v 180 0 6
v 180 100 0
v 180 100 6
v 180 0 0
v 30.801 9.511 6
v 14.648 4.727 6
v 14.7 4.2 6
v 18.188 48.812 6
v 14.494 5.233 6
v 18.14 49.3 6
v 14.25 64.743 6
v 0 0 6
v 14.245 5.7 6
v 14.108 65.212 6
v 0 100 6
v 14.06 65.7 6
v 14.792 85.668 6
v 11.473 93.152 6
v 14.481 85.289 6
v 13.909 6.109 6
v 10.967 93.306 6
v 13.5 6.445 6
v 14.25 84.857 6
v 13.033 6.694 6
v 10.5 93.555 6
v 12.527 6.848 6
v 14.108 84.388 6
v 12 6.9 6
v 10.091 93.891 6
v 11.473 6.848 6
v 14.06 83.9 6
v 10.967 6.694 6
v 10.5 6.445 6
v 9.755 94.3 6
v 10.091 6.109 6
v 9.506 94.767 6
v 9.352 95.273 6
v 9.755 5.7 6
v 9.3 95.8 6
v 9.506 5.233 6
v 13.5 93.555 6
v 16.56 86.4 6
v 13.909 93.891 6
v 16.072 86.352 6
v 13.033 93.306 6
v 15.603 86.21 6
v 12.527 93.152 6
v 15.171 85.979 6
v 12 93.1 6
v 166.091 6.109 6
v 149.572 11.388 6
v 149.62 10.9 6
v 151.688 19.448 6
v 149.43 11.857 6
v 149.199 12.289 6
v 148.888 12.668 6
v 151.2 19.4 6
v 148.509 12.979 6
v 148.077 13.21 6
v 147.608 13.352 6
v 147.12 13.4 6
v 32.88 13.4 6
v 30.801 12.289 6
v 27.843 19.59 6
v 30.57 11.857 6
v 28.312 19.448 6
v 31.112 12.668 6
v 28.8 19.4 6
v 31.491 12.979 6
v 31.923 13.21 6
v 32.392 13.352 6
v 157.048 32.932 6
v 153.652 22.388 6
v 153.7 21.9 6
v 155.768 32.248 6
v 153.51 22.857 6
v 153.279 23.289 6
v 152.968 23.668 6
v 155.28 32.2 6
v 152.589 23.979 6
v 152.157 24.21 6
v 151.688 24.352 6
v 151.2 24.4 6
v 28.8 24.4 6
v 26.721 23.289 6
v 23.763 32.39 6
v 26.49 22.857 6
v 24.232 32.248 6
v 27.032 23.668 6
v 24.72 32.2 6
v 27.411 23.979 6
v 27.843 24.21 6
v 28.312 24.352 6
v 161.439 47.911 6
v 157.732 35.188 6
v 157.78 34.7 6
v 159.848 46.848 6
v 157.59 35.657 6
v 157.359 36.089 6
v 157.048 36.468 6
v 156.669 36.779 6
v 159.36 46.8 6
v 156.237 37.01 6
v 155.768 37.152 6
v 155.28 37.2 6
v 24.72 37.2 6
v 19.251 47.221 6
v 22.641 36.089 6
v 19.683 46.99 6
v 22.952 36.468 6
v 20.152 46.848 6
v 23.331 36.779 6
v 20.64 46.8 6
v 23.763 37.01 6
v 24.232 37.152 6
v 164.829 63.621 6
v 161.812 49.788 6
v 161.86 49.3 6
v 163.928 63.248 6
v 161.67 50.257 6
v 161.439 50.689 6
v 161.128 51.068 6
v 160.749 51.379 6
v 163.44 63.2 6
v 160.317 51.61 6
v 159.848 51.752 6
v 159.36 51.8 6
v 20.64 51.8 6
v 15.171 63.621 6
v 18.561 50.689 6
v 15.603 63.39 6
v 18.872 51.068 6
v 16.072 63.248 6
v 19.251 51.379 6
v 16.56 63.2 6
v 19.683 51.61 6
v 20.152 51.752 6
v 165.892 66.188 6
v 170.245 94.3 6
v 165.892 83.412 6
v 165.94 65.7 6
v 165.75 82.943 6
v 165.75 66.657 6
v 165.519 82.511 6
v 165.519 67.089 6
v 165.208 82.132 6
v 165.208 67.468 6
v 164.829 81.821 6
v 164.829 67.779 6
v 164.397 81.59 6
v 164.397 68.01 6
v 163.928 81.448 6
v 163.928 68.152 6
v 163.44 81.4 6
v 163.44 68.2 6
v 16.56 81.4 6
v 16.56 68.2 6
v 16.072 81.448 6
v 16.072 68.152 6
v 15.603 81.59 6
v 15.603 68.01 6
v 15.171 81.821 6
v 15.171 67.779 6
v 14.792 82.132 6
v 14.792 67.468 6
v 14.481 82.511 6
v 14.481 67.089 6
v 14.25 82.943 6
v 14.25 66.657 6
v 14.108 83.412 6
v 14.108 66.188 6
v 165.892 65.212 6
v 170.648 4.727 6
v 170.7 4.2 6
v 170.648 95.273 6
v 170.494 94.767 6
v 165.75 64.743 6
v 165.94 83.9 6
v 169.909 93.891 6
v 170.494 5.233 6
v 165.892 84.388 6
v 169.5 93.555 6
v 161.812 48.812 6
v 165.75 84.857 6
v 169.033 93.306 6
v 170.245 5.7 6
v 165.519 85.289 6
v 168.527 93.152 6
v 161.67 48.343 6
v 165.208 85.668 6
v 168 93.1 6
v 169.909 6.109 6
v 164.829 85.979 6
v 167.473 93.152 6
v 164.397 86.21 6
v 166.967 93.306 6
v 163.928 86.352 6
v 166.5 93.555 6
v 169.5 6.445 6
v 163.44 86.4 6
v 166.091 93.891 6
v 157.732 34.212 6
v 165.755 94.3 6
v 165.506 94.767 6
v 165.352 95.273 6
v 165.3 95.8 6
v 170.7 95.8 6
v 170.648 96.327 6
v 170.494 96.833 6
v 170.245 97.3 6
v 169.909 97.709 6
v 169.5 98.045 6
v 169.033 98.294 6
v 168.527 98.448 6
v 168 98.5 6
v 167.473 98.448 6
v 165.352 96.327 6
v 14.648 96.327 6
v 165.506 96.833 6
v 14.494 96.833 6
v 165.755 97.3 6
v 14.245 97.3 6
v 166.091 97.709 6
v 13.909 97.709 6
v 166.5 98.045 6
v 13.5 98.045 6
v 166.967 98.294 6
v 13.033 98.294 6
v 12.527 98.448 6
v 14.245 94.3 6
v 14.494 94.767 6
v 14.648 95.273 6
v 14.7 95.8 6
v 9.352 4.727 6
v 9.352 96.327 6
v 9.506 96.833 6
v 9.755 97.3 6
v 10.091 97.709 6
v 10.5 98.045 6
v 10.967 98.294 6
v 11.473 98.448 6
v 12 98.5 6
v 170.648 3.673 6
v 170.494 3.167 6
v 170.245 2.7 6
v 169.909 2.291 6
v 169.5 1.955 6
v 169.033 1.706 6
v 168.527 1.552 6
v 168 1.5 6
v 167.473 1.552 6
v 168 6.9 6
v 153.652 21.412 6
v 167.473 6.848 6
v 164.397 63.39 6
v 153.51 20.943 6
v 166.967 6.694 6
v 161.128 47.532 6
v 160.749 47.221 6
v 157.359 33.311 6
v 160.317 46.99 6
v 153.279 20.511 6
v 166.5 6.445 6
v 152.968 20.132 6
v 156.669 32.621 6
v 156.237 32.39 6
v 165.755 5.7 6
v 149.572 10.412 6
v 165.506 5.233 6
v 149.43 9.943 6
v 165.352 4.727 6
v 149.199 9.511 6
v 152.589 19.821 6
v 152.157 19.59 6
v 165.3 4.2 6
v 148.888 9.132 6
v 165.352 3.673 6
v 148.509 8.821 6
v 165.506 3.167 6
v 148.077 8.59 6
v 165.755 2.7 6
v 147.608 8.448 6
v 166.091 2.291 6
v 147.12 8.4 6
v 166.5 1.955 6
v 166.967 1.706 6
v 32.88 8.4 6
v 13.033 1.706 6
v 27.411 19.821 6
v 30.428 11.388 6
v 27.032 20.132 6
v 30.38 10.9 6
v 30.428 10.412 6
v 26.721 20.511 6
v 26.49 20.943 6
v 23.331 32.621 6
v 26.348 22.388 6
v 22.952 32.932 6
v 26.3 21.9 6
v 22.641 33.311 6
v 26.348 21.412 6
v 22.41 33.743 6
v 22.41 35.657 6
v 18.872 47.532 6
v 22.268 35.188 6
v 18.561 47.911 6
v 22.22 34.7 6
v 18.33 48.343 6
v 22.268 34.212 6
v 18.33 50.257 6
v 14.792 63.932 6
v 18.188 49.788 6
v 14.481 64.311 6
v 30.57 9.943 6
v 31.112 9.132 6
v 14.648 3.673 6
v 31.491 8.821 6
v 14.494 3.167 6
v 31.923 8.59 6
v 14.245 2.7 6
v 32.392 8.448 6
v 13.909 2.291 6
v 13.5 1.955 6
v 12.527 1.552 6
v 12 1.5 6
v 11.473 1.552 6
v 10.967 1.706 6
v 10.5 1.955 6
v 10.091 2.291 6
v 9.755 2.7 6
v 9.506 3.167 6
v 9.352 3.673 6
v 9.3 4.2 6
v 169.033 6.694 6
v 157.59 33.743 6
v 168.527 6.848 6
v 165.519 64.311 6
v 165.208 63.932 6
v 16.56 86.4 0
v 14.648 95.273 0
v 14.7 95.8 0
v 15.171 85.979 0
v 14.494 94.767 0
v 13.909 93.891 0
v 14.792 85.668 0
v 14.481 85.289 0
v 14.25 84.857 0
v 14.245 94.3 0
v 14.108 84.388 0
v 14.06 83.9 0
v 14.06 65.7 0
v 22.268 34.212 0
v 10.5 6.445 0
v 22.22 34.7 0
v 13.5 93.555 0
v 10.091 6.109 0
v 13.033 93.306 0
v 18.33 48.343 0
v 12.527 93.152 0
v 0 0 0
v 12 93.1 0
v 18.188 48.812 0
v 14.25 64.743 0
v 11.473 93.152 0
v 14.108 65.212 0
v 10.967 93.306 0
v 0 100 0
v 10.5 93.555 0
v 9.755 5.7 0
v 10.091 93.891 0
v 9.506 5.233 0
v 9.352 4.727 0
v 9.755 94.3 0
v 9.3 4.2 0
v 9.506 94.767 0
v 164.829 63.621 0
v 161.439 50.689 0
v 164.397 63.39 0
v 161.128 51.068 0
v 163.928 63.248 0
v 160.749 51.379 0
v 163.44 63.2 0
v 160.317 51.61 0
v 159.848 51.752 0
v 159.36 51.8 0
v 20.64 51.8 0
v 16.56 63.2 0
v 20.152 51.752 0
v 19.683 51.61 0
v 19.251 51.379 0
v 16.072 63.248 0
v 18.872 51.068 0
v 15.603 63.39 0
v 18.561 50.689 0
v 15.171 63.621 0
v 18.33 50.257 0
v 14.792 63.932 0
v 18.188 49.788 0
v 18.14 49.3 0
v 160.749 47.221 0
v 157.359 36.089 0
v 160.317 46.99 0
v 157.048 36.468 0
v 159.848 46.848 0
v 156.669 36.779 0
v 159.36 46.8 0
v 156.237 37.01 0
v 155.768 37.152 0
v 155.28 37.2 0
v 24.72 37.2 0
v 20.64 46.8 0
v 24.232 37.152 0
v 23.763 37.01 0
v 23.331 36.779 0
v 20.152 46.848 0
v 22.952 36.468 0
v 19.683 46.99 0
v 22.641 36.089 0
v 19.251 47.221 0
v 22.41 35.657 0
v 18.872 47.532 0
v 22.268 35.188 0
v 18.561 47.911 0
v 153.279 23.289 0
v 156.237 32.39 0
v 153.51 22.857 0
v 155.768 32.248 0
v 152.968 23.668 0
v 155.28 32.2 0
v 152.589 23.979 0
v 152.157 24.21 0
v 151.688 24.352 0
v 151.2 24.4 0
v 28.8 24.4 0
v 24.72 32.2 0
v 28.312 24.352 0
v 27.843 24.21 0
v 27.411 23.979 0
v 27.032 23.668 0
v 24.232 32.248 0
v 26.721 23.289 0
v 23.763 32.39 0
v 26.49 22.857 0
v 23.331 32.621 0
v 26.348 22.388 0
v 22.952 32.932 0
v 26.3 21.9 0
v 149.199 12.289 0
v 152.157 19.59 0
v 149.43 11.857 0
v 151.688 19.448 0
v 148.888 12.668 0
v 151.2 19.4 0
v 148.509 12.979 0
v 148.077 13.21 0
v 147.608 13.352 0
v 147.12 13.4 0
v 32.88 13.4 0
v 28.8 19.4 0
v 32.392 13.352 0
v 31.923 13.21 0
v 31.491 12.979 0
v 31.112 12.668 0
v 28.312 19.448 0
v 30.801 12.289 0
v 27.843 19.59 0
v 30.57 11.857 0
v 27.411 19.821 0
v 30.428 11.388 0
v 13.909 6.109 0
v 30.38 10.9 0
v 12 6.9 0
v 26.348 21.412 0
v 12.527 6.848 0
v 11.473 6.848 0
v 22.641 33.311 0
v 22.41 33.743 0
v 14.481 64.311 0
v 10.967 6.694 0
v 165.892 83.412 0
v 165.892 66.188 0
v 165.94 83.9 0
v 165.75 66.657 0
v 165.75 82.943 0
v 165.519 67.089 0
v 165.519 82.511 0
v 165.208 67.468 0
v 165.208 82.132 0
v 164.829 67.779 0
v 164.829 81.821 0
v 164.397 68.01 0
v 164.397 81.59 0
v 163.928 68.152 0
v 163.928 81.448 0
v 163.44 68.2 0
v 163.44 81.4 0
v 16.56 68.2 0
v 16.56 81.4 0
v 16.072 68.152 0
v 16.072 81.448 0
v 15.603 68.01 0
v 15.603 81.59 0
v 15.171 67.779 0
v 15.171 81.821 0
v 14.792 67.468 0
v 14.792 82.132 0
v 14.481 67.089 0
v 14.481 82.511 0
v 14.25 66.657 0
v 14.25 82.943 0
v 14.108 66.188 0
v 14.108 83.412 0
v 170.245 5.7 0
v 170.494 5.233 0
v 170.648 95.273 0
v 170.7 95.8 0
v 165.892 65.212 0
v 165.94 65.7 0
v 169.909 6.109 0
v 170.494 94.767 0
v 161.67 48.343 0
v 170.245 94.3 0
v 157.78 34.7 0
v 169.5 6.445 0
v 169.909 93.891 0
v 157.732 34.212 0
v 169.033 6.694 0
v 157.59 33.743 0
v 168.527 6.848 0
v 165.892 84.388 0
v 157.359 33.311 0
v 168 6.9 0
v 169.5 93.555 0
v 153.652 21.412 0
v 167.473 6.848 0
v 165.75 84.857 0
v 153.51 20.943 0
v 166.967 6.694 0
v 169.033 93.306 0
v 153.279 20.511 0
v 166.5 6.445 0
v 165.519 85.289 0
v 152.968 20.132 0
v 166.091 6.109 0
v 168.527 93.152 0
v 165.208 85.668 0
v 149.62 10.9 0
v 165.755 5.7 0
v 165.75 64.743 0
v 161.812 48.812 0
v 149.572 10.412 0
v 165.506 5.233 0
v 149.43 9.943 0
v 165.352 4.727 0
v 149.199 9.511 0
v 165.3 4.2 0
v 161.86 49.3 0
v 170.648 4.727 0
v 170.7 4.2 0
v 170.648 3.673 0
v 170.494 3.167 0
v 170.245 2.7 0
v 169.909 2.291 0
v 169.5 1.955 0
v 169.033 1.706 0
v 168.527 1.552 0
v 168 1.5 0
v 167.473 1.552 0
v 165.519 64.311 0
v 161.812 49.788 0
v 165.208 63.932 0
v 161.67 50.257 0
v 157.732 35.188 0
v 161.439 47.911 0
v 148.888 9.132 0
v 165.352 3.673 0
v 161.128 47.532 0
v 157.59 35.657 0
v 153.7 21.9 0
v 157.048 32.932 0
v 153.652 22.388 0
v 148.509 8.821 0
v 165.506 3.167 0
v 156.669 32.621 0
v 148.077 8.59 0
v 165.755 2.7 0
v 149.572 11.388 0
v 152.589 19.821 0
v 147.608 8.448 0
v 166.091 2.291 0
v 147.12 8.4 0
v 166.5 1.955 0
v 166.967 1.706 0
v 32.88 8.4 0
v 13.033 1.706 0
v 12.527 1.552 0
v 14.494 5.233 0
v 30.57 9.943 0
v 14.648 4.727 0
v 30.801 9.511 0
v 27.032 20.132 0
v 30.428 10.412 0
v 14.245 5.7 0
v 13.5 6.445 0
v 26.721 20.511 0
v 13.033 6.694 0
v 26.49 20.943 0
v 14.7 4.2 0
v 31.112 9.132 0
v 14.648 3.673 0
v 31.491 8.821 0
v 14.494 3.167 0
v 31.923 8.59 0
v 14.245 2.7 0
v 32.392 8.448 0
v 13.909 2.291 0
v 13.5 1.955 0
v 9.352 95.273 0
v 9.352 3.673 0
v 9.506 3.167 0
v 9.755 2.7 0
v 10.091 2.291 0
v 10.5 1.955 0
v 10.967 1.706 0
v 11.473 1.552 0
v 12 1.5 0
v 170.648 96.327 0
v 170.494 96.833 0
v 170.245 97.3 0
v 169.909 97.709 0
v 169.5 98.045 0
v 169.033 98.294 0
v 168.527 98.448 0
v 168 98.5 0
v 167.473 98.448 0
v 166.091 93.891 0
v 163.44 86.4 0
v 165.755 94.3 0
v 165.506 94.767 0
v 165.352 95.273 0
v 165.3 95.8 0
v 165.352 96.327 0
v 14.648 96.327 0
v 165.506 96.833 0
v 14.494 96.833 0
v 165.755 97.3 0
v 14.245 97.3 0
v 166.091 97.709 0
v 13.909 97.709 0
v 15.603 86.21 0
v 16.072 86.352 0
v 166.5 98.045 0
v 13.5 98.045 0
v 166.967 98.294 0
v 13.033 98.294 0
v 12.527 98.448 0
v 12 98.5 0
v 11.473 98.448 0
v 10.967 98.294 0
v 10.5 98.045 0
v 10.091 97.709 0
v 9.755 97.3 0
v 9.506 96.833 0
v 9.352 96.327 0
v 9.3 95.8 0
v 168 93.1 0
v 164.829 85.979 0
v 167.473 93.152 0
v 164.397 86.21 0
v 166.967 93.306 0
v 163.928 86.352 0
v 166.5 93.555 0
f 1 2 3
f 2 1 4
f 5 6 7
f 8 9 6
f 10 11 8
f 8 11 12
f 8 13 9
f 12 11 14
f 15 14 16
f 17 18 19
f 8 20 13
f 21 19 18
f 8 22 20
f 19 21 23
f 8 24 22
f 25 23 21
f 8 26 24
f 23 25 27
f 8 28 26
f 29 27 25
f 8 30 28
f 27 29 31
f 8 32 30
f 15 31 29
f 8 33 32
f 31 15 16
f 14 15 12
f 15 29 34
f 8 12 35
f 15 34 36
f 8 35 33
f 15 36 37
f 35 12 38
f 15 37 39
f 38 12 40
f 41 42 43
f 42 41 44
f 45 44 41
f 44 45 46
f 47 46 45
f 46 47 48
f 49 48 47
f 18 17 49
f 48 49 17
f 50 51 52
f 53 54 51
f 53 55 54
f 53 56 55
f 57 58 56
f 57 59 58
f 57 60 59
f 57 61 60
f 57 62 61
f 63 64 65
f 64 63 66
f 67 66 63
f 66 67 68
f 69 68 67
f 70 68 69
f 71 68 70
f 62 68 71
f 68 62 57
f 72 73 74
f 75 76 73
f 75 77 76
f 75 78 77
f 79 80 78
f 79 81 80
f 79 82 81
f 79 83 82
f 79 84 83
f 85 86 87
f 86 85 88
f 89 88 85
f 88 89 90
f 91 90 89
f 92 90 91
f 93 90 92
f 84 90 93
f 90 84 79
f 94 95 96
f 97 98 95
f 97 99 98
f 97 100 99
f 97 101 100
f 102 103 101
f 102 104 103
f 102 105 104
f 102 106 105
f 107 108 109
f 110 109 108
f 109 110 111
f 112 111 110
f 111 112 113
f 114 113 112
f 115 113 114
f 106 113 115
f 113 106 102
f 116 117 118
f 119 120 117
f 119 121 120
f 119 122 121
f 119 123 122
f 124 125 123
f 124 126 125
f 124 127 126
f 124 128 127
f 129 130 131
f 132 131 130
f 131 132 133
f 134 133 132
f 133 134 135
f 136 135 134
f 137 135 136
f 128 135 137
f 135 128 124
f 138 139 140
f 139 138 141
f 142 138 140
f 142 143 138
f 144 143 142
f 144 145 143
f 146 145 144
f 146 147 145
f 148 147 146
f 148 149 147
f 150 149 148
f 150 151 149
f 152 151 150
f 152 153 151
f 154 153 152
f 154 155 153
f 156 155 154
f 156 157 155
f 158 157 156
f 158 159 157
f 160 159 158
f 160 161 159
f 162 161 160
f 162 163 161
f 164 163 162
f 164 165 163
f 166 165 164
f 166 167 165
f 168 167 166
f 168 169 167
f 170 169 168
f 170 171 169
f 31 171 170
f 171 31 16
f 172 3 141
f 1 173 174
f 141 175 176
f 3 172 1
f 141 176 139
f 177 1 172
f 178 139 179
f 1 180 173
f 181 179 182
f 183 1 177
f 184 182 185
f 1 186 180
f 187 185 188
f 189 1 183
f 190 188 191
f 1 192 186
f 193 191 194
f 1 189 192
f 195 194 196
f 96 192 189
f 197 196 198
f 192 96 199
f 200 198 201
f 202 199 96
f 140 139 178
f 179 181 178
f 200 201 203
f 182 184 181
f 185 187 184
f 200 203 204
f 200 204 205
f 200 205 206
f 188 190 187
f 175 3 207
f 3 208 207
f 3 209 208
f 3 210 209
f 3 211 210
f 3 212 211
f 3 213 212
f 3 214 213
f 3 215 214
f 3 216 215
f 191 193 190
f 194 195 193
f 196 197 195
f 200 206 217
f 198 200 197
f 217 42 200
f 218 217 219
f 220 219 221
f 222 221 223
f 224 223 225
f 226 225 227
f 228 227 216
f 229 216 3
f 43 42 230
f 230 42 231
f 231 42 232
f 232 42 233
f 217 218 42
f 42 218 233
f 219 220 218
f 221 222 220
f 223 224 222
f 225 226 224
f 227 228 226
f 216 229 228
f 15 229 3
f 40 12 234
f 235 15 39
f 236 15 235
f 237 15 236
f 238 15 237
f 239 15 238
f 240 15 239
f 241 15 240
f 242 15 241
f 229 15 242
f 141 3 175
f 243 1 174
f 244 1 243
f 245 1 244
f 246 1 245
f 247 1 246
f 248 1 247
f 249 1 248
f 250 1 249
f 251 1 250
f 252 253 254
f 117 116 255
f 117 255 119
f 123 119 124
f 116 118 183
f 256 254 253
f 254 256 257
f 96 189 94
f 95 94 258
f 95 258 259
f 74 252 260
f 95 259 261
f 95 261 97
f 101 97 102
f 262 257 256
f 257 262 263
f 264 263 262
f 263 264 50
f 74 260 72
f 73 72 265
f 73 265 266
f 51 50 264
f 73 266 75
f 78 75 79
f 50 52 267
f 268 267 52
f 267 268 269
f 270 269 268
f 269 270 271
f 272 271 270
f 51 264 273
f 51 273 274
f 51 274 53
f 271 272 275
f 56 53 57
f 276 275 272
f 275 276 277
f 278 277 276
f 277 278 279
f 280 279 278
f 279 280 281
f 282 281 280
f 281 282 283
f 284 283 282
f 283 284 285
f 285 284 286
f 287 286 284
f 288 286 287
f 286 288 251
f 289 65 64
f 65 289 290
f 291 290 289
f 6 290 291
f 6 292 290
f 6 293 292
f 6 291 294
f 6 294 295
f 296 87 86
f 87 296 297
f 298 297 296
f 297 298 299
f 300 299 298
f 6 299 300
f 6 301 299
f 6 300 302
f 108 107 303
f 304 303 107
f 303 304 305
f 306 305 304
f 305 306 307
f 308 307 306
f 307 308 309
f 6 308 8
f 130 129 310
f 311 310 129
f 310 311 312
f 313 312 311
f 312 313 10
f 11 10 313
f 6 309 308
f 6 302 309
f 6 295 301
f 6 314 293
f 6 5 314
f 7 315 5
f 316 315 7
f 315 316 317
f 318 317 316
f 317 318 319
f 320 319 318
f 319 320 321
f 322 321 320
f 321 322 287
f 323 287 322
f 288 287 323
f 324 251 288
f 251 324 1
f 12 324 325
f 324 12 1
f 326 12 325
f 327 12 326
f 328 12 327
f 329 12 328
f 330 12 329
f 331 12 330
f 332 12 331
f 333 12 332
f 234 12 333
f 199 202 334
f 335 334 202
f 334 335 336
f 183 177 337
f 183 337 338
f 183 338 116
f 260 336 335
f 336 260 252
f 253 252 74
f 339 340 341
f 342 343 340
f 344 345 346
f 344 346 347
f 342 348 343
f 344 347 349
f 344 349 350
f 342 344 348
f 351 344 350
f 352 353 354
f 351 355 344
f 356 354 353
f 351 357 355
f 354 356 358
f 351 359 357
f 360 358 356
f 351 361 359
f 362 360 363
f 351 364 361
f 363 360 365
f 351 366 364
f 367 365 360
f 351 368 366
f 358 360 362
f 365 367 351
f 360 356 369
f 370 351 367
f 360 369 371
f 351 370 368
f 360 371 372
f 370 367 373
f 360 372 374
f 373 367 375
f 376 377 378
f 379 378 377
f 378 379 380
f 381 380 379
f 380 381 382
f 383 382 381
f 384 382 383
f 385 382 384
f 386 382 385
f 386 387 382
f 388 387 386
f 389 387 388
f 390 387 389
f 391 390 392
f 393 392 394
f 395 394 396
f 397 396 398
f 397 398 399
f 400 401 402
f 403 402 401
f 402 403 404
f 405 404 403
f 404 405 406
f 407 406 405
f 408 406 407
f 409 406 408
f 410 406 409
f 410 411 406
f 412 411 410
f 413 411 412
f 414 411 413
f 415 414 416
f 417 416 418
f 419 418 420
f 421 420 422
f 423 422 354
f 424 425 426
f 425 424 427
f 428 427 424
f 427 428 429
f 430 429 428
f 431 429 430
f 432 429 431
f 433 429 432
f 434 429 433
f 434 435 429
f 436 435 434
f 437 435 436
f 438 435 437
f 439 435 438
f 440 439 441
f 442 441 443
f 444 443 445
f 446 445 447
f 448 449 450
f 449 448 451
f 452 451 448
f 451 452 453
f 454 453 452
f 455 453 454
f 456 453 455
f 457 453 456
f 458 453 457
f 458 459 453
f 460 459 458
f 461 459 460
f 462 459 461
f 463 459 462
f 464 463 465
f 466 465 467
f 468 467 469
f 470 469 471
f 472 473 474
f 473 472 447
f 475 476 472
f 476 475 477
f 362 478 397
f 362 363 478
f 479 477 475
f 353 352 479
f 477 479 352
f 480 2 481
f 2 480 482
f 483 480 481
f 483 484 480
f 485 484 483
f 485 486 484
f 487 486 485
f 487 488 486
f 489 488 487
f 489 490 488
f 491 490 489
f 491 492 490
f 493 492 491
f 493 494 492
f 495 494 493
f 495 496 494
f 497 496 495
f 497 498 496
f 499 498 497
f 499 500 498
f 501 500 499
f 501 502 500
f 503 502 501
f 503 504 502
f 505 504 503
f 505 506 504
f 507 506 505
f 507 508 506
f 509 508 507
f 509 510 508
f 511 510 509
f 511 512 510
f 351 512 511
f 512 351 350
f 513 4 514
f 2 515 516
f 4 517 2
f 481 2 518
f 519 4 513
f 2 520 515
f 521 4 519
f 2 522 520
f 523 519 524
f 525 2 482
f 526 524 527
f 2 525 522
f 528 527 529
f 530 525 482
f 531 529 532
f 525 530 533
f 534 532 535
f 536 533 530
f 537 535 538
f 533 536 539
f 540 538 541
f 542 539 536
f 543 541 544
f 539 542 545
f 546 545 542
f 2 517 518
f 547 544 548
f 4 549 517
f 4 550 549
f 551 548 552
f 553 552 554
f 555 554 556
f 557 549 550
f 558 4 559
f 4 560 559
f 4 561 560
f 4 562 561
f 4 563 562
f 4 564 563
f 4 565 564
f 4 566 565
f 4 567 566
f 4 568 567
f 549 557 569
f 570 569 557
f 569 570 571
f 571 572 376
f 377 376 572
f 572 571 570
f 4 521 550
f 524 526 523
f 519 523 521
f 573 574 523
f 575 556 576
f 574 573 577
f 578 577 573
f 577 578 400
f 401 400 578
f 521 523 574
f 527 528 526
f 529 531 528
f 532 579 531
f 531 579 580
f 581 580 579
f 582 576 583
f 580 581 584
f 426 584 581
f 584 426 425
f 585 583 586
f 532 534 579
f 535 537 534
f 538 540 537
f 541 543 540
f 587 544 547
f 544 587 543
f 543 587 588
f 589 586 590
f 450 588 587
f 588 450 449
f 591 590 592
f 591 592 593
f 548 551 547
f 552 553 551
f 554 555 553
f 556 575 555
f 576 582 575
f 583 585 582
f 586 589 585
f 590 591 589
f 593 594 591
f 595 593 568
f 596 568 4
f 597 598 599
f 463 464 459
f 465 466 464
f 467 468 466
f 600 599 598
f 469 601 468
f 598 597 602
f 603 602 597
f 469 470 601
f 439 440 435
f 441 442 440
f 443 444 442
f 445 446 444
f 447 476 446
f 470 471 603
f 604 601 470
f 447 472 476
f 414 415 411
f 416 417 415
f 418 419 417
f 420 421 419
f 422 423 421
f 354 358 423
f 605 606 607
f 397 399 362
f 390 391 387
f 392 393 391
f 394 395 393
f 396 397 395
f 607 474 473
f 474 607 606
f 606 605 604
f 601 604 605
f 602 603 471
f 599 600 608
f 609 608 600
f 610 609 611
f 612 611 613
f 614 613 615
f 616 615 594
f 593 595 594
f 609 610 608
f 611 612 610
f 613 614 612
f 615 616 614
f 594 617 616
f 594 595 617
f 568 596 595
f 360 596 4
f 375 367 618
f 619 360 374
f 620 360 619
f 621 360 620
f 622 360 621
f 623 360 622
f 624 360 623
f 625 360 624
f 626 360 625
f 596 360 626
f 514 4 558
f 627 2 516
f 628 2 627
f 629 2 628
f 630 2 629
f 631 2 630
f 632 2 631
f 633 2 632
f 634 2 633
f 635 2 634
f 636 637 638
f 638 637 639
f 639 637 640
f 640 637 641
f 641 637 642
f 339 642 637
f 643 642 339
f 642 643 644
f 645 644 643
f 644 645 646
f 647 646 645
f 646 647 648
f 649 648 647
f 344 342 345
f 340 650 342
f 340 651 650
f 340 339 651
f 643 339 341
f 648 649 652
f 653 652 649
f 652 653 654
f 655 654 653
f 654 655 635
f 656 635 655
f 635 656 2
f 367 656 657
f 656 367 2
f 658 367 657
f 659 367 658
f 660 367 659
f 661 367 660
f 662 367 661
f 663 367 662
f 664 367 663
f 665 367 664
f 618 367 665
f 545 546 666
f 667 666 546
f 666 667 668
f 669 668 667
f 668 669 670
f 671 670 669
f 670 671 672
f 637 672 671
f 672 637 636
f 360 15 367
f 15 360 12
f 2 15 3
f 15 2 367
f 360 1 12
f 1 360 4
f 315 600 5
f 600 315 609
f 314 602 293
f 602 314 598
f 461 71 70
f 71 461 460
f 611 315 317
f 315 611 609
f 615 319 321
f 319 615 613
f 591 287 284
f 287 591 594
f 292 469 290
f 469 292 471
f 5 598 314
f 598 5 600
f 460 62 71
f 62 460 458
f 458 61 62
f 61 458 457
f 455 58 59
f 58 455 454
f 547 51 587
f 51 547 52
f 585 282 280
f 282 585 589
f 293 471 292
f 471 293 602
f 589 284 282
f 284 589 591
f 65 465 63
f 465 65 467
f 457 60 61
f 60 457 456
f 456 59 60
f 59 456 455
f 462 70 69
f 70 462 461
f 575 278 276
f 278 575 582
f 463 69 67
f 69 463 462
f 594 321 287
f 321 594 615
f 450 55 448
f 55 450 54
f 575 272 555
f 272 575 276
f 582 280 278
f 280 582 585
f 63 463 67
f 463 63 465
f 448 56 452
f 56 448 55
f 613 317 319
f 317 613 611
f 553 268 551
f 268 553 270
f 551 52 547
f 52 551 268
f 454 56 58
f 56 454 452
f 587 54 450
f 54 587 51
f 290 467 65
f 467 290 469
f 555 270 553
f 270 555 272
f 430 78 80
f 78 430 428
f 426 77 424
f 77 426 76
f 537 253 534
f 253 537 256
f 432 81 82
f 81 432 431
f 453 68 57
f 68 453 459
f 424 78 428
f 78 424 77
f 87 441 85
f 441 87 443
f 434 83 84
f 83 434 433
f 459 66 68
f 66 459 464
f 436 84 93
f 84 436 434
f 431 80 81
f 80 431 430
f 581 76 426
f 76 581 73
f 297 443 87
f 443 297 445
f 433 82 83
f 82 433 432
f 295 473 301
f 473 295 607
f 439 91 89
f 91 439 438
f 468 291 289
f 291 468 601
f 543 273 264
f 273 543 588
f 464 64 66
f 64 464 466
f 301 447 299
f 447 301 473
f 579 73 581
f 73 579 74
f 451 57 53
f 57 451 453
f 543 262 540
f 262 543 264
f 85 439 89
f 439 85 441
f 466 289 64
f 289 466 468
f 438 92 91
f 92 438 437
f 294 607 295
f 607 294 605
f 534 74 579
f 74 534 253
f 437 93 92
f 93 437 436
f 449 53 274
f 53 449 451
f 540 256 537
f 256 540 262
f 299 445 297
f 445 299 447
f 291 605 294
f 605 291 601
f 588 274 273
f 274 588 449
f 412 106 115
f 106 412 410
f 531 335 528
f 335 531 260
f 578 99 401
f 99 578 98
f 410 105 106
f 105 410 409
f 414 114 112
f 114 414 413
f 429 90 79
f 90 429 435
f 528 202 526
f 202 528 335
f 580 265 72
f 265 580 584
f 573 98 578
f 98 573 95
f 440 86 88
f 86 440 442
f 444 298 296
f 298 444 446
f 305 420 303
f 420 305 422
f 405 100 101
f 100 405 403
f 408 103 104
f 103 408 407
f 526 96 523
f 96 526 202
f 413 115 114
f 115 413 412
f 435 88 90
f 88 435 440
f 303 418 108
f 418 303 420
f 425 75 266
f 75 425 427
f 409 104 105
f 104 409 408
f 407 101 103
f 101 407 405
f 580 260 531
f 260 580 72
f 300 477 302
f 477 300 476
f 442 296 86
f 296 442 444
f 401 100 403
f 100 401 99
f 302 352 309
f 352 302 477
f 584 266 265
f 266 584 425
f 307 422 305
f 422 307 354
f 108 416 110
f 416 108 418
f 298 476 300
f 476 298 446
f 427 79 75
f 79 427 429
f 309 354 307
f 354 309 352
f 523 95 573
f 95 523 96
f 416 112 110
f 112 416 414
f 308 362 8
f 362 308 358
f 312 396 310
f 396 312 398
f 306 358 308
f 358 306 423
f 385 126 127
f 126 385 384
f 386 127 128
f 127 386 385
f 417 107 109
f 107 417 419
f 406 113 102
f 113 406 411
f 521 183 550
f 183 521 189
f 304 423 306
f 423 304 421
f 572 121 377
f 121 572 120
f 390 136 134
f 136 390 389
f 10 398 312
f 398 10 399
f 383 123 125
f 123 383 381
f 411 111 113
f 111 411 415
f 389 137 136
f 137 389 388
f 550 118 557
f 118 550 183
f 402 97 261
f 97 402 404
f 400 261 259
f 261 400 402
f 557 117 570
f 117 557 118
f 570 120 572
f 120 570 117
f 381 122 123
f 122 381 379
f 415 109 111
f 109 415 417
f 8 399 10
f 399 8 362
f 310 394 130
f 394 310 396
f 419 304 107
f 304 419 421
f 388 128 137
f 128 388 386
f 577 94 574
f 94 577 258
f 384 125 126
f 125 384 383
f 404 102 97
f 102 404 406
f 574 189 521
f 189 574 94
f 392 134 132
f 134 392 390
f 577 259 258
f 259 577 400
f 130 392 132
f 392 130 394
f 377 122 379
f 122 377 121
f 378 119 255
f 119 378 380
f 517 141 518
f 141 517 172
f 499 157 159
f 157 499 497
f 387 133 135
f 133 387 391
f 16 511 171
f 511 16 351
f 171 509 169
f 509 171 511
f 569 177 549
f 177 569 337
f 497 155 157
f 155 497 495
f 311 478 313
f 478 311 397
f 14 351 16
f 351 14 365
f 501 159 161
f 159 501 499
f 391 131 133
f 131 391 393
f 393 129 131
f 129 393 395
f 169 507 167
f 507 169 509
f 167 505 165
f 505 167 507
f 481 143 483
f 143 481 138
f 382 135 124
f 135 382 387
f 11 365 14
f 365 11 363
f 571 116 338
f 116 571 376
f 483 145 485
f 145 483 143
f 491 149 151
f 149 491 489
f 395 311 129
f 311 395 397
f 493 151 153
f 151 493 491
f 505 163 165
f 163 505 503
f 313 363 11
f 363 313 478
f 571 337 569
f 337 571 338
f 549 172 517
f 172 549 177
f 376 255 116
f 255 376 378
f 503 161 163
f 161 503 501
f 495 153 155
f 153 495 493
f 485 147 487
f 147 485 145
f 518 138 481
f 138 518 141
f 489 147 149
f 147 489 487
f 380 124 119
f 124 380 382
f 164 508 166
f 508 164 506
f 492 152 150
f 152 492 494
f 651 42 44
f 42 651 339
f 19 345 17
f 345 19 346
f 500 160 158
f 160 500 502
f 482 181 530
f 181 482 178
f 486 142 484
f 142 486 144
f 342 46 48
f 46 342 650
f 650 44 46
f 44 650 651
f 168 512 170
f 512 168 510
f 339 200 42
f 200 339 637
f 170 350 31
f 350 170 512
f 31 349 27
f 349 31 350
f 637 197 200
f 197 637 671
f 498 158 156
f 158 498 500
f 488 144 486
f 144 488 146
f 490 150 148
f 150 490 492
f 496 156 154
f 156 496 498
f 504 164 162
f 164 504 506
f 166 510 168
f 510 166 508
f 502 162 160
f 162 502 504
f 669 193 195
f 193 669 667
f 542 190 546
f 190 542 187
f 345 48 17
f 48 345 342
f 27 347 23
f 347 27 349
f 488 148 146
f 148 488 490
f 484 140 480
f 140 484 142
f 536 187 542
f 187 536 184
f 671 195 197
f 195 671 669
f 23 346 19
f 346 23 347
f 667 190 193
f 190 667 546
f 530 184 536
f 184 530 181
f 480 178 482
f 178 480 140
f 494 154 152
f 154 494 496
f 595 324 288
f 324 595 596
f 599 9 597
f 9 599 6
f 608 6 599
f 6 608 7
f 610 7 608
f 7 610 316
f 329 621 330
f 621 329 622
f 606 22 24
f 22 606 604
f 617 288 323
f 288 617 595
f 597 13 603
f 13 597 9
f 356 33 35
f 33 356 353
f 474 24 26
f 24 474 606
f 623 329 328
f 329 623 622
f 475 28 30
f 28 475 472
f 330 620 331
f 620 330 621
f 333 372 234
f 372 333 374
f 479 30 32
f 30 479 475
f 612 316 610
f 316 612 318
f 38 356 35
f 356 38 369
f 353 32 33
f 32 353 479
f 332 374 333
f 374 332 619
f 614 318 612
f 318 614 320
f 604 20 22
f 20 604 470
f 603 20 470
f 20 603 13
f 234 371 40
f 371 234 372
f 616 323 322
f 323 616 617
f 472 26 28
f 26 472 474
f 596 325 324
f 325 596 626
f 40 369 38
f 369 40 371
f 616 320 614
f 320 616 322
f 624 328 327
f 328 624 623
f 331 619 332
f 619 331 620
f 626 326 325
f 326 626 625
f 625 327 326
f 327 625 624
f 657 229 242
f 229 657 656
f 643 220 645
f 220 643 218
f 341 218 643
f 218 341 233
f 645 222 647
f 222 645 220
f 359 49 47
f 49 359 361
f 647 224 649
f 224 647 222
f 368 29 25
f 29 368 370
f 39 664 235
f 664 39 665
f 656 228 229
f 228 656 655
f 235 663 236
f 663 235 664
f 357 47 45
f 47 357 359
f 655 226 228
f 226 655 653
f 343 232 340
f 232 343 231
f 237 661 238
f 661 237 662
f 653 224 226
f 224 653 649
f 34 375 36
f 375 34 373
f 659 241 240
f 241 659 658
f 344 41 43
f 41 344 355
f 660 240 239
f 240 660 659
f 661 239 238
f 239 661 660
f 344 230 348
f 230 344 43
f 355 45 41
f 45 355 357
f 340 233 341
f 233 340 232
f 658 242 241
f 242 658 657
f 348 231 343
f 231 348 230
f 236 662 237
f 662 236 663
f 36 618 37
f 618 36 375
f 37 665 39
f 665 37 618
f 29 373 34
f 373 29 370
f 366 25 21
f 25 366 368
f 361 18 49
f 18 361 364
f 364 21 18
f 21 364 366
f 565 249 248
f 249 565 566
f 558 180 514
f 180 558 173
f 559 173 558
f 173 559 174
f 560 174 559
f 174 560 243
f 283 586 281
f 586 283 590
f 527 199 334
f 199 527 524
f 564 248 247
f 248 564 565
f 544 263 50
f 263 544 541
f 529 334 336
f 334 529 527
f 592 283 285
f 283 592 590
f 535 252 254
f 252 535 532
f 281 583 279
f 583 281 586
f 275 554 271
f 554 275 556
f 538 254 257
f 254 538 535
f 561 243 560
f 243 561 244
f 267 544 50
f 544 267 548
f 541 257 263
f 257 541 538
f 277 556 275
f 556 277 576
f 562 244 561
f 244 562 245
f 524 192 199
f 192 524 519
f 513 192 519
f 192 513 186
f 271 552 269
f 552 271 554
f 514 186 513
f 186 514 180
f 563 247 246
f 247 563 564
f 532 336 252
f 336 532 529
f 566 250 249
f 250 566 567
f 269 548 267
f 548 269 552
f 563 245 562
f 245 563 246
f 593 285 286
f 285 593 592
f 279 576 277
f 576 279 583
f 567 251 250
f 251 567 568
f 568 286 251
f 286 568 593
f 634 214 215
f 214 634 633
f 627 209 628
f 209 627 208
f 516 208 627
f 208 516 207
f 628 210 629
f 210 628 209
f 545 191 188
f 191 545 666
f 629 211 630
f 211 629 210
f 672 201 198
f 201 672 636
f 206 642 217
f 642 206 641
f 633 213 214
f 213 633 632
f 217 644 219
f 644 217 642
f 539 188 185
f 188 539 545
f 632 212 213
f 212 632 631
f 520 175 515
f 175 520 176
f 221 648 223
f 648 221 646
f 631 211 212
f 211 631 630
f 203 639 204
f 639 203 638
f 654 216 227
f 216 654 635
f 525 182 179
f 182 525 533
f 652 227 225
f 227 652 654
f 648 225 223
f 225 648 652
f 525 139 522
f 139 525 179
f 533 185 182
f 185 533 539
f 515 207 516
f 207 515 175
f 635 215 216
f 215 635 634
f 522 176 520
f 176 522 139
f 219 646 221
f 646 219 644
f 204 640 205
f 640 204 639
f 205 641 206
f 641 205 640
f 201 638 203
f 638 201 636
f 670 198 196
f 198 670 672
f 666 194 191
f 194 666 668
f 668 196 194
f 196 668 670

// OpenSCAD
$fn = 32;

// ----------------------------------------------------------------------
// Slotted panel: 180 x 100 mm, 6 рядов of slots
// ----------------------------------------------------------------------

// --- parameters (mm) ---
panel_w = 180;            // panel width
panel_d = 100;            // panel depth
thick = 6;                // panel thickness
slot_w = 5;               // slot width
pitch0 = 11;              // first row pitch
pitch_step = 1.8;         // pitch increase per row
margin = 8.4;             // margin around the slot field
rows = 6;                 // number of slot rows
mount_d = 5.4;            // mounting holes
mount_x = 78;             // mounting hole offset

difference() {
  union() {
    cube([panel_w, panel_d, thick]);
  }
  /* slot rows: stadium shaped cutters, 2.5 mm clear of both faces */
  /* row 0: pitch 11, length 114.24 */
  hull() {
    translate([32.88, 10.9, -2.5]) cylinder(h = thick + 5, d = slot_w);
    translate([147.12, 10.9, -2.5]) cylinder(h = thick + 5, d = slot_w);
  }
  /* row 1: pitch 12.8, length 122.4 */
  hull() {
    translate([28.8, 21.9, -2.5]) cylinder(h = thick + 5, d = slot_w);
    translate([151.2, 21.9, -2.5]) cylinder(h = thick + 5, d = slot_w);
  }
  /* row 2: pitch 14.6, length 130.56 */
  hull() {
    translate([24.72, 34.7, -2.5]) cylinder(h = thick + 5, d = slot_w);
    translate([155.28, 34.7, -2.5]) cylinder(h = thick + 5, d = slot_w);
  }
  /* row 3: pitch 16.4, length 138.72 */
  hull() {
    translate([20.64, 49.3, -2.5]) cylinder(h = thick + 5, d = slot_w);
    translate([159.36, 49.3, -2.5]) cylinder(h = thick + 5, d = slot_w);
  }
  /* row 4: pitch 18.2, length 146.88 */
  hull() {
    translate([16.56, 65.7, -2.5]) cylinder(h = thick + 5, d = slot_w);
    translate([163.44, 65.7, -2.5]) cylinder(h = thick + 5, d = slot_w);
  }
  /* row 5: pitch 20, length 146.88 */
  hull() {
    translate([16.56, 83.9, -2.5]) cylinder(h = thick + 5, d = slot_w);
    translate([163.44, 83.9, -2.5]) cylinder(h = thick + 5, d = slot_w);
  }
  translate([12, 4.2, -2.5]) cylinder(h = 11, d = mount_d);
  translate([12, 95.8, -2.5]) cylinder(h = 11, d = mount_d);
  translate([168, 4.2, -2.5]) cylinder(h = 11, d = mount_d);
  translate([168, 95.8, -2.5]) cylinder(h = 11, d = mount_d);
}
